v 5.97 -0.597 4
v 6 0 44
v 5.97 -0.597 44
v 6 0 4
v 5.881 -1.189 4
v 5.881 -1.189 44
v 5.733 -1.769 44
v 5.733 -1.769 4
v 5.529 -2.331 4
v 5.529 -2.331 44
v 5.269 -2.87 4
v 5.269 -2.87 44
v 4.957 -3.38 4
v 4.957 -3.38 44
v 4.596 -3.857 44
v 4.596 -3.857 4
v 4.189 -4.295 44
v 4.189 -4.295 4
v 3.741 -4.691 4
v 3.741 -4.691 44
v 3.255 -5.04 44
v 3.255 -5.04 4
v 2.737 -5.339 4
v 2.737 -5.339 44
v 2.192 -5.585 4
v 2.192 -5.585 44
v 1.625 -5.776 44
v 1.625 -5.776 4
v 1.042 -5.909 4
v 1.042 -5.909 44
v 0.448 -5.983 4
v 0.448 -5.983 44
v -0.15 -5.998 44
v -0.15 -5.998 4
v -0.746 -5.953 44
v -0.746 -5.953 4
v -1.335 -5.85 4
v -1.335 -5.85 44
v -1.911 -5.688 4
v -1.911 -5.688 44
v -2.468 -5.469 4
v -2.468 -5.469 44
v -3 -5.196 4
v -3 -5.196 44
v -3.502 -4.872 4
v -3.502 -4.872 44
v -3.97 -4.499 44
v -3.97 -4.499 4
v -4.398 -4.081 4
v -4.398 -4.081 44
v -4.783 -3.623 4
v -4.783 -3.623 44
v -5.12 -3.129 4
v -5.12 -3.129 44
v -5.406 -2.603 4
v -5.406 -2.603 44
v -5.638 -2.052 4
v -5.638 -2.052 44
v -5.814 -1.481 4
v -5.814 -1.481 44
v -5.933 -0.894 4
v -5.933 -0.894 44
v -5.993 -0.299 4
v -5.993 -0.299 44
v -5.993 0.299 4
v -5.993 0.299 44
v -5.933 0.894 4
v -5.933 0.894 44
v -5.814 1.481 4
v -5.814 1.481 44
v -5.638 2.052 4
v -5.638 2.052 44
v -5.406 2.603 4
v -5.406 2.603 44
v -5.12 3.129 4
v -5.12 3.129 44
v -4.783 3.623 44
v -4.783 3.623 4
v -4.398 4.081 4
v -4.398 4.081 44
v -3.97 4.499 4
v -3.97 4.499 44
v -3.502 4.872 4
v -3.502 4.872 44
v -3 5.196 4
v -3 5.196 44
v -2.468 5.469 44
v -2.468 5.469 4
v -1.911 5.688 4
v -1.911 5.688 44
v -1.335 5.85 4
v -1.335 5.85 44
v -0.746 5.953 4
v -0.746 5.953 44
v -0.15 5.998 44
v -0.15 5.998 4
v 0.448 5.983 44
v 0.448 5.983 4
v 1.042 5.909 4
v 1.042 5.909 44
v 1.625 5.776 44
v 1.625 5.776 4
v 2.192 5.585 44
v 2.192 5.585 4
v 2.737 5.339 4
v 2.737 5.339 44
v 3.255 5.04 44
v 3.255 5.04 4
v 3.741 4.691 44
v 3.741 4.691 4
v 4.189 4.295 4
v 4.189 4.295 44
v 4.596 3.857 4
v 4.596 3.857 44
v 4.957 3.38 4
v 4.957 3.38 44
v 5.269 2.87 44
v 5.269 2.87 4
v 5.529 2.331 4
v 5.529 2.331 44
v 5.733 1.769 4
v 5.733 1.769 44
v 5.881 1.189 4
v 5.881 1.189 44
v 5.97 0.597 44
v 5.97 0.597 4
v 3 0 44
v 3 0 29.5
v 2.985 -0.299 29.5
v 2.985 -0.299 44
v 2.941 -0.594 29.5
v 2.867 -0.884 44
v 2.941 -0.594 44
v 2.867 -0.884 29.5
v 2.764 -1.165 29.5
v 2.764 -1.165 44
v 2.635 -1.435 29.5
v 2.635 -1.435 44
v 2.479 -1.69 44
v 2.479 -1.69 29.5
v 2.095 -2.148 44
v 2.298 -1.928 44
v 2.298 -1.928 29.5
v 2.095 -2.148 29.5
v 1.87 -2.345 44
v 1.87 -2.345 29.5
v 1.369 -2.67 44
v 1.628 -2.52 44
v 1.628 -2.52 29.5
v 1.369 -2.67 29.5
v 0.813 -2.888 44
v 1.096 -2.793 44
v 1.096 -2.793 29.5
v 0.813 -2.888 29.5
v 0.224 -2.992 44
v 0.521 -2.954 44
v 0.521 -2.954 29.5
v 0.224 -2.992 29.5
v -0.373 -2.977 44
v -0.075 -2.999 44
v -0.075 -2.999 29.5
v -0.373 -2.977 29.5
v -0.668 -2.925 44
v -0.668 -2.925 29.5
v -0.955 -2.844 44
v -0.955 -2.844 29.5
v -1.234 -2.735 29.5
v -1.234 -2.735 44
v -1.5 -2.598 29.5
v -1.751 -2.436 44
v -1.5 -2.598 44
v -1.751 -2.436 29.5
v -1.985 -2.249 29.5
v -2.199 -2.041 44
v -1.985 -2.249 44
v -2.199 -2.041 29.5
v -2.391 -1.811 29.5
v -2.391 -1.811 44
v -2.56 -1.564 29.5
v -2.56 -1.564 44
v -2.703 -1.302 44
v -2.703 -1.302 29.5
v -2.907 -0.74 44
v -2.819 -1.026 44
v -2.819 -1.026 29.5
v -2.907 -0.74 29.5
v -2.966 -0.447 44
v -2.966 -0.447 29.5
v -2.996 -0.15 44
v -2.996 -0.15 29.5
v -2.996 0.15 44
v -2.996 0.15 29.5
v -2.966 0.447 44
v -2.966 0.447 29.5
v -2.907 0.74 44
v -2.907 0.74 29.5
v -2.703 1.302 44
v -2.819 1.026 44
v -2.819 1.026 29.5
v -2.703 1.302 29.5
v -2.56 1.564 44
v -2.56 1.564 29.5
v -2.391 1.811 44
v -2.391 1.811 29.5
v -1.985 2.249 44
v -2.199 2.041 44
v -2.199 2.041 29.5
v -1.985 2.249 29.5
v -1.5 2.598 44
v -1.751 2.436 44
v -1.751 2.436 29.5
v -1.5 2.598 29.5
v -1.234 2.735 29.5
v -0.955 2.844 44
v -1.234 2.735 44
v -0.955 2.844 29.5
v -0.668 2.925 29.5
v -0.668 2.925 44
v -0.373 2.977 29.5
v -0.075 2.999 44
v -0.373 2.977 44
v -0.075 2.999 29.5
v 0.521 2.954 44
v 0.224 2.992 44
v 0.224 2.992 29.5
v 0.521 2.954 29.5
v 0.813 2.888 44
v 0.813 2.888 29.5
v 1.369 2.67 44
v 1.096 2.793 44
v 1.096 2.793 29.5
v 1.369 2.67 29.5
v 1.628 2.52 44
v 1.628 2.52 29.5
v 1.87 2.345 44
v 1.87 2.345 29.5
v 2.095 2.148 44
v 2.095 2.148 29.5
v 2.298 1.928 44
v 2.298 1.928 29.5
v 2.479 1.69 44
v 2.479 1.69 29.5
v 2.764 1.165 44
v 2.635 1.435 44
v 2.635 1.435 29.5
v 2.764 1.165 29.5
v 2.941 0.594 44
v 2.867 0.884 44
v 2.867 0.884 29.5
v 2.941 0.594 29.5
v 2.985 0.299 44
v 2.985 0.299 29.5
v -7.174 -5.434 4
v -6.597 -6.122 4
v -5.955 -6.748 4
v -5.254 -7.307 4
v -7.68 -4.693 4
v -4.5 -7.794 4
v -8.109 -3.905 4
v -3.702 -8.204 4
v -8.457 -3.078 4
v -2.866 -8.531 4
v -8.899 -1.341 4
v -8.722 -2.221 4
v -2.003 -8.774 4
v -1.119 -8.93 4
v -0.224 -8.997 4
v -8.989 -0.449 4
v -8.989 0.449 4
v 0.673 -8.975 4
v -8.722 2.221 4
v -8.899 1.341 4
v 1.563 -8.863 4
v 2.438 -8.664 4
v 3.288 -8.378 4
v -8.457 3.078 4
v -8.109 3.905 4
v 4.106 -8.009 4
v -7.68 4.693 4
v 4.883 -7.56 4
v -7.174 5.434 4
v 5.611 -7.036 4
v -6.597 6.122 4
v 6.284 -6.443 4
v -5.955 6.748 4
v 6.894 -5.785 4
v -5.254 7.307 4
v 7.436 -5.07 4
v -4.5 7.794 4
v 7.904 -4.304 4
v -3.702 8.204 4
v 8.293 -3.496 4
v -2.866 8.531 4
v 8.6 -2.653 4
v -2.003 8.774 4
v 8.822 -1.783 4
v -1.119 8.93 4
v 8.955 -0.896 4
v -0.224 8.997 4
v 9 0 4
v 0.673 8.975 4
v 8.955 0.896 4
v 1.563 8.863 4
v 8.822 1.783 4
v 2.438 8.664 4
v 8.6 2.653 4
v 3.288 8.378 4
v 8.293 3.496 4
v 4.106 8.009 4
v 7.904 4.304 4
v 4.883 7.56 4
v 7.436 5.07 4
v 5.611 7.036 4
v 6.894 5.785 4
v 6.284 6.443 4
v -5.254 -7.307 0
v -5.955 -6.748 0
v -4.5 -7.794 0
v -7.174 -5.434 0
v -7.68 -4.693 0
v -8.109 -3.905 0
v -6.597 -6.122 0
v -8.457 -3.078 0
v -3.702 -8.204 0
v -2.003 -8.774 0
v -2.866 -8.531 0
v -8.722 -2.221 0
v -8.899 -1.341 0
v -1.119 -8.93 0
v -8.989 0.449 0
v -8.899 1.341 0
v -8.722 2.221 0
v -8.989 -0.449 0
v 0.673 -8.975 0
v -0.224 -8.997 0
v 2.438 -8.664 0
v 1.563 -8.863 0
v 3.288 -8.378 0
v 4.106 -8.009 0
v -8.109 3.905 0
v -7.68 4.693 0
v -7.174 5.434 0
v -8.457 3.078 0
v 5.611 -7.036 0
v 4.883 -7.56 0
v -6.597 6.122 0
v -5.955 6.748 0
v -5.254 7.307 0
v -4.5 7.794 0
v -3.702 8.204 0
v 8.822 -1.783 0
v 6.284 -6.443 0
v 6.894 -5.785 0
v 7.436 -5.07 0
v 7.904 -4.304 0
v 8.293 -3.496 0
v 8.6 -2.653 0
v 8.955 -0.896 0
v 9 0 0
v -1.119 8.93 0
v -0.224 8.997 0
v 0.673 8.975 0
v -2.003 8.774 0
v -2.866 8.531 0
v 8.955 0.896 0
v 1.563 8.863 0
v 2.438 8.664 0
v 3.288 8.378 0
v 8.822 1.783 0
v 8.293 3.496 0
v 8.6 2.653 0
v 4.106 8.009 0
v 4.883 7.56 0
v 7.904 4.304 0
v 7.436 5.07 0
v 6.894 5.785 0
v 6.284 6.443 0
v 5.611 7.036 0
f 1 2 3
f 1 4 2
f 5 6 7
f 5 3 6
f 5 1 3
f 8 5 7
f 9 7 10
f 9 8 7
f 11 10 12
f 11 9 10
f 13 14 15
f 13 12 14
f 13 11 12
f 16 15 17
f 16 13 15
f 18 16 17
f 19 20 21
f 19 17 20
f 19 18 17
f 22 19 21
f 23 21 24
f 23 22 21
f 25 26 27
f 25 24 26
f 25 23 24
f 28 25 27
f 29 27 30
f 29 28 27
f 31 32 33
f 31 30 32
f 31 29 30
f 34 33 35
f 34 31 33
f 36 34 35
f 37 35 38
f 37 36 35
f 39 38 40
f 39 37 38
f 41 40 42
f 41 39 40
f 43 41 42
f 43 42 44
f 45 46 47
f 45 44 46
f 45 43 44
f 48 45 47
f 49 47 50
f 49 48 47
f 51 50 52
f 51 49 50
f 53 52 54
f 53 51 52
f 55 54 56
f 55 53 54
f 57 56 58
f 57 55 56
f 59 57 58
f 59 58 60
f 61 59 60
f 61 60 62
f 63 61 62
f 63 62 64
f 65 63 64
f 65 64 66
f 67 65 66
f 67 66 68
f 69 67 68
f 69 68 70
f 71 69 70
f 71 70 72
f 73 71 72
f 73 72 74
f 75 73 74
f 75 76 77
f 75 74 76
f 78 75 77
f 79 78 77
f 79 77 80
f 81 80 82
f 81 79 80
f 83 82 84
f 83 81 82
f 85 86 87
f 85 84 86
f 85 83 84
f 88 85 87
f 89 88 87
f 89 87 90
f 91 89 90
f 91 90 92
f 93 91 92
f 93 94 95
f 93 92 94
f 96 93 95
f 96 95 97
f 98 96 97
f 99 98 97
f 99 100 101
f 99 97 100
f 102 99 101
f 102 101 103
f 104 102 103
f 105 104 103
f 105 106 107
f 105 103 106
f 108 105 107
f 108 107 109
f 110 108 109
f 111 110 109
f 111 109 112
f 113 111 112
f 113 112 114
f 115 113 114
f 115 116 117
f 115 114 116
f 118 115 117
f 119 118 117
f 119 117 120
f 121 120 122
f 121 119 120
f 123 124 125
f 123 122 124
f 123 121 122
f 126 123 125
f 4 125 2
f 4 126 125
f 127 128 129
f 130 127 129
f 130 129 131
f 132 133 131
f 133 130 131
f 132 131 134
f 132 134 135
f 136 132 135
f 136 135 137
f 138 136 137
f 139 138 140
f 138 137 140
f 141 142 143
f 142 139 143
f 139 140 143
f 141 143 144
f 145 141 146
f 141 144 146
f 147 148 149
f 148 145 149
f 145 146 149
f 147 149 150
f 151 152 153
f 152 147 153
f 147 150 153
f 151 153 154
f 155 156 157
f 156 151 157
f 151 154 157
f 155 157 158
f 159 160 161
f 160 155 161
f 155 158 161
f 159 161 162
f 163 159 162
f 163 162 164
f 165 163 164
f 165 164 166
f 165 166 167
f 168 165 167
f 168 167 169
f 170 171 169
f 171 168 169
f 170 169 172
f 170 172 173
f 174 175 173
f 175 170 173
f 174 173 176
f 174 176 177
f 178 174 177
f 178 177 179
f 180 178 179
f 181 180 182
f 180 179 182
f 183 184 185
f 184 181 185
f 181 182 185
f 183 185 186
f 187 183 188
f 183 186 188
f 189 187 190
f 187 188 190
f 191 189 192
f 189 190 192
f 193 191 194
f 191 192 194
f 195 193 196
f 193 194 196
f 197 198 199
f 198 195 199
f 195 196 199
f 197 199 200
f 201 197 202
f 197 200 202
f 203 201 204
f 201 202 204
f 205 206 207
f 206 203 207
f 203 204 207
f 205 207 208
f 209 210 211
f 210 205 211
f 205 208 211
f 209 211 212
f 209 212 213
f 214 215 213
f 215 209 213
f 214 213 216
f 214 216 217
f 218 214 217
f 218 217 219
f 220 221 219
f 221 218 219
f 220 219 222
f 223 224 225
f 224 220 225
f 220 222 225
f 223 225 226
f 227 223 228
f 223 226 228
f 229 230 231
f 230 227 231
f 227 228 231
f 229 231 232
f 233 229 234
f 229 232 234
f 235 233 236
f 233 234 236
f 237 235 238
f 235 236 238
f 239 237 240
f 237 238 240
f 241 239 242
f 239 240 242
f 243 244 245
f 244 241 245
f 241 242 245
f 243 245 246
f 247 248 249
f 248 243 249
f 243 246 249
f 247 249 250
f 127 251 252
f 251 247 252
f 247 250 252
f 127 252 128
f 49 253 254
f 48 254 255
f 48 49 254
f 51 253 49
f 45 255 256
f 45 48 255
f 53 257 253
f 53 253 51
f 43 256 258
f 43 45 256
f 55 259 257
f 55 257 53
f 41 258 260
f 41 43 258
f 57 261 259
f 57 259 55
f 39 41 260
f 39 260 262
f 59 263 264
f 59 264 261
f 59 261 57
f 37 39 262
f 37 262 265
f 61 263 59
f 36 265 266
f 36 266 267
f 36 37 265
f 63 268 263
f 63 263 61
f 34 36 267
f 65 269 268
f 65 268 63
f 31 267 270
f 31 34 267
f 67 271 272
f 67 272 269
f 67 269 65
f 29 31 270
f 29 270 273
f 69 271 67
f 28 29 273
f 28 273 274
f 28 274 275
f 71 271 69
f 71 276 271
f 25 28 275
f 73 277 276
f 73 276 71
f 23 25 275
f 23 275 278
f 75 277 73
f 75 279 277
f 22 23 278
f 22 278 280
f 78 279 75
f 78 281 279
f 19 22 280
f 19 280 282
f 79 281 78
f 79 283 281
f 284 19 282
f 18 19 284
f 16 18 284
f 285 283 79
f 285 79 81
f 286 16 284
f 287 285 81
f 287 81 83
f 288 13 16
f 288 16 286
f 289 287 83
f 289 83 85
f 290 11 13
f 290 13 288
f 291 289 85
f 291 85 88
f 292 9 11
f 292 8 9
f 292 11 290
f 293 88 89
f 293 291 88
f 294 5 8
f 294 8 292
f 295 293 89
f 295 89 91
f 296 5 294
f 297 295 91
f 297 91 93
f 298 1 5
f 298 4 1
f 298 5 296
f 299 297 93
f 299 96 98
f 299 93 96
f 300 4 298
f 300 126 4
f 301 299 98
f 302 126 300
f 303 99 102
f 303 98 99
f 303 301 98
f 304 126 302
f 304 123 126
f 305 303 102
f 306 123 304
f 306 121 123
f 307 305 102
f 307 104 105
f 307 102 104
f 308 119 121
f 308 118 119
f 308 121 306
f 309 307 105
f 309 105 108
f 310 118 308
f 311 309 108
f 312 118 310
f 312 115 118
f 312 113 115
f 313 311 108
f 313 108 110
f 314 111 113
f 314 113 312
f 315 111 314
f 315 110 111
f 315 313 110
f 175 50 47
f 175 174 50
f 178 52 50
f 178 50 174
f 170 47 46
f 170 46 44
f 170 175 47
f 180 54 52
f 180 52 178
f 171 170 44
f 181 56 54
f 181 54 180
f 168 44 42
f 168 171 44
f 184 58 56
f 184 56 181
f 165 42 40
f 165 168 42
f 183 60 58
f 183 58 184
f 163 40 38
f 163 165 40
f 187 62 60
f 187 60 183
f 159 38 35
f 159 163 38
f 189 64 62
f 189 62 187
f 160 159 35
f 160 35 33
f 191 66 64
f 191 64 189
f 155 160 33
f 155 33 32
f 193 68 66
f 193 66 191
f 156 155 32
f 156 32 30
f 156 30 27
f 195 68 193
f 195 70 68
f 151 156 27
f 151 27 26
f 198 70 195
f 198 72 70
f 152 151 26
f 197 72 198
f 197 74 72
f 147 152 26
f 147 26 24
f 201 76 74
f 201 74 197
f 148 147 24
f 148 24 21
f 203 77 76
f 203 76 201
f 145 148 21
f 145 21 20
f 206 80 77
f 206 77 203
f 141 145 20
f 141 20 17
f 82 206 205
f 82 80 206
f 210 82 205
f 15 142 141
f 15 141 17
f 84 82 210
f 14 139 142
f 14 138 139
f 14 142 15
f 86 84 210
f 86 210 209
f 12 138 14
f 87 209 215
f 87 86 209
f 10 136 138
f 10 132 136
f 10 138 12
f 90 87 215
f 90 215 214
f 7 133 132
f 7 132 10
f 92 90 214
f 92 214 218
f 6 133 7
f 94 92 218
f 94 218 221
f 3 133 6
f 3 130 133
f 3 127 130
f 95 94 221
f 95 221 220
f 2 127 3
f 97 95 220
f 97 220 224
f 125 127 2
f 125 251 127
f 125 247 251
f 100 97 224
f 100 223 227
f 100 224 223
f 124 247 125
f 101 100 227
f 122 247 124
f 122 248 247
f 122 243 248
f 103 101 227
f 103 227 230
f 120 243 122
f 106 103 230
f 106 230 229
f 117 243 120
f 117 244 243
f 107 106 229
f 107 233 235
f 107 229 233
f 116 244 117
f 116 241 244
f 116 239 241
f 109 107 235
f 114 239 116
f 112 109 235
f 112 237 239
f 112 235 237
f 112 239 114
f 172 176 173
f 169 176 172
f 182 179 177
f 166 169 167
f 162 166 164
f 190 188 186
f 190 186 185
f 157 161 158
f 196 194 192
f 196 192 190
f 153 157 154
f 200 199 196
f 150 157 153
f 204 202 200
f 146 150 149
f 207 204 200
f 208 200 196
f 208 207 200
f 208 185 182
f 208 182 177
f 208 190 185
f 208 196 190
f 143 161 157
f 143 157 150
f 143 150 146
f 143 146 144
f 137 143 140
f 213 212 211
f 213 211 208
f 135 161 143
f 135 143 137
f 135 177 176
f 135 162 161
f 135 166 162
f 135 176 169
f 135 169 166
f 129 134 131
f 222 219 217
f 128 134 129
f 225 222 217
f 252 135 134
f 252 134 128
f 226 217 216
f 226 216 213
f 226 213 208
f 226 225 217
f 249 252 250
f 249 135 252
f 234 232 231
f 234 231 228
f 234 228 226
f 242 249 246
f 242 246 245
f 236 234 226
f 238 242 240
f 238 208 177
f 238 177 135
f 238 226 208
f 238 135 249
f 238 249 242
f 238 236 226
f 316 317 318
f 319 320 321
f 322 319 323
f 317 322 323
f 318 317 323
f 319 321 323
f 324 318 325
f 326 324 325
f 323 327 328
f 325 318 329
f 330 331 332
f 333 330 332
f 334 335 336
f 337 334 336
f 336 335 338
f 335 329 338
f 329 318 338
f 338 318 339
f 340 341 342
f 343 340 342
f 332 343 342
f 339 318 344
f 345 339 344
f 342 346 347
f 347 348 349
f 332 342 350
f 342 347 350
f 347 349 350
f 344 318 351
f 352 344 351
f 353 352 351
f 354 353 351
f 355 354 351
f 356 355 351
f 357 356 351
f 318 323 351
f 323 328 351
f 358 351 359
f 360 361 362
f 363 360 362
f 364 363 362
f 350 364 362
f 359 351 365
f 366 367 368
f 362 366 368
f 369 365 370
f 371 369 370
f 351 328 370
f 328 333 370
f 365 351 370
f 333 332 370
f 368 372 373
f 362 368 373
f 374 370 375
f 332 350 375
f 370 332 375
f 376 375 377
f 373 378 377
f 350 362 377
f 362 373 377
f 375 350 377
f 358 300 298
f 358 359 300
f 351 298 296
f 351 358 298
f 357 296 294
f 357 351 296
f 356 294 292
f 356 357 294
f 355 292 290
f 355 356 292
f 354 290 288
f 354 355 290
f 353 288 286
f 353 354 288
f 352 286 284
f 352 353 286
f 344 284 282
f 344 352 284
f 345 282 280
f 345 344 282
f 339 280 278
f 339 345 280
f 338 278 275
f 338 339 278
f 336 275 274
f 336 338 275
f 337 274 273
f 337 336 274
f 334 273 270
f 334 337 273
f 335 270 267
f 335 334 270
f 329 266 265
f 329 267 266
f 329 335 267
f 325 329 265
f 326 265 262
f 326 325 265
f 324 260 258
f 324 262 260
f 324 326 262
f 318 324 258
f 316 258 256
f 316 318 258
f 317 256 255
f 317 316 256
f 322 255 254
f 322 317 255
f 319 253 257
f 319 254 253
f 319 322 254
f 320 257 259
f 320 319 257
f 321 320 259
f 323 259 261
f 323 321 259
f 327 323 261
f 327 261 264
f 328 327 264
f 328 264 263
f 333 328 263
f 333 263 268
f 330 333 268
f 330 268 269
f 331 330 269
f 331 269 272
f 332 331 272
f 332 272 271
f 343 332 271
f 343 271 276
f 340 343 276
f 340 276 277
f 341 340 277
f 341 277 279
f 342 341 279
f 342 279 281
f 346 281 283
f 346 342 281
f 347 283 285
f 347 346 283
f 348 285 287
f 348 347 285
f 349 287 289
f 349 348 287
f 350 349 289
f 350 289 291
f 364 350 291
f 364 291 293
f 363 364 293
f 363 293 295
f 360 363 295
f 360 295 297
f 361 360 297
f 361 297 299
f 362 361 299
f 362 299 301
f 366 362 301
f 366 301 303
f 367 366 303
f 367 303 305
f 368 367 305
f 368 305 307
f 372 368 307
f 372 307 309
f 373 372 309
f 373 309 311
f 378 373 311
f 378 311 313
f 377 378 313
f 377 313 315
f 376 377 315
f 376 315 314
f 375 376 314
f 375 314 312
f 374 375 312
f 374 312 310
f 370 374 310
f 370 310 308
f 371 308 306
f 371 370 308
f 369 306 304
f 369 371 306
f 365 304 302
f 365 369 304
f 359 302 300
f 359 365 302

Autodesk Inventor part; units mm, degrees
ref_plane "YZ Plane" through (0, 0, 0) normal (1, 0, 0) x (0, 1, 0)
ref_plane "XZ Plane" through (0, 0, 0) normal (0, 1, 0) x (-1, 0, 0)
ref_plane "XY Plane" through (0, 0, 0) normal (0, 0, 1) x (1, 0, 0)
sketch "Sketch1" plane through (0, 0, 0) normal (0, 0, 1) x (1, 0, 0)
  circle A0 centre (0, 0) radius 9
  dimension "d0" = 18
extrude "Extrusion1" add sketch "Sketch1" along normal blind 4
sketch "Sketch2" plane through (0, 0, 4) normal (0, 0, 1) x (1, 0, 0)
  circle A0 centre (0, 0) radius 6
  circle A1 centre (0, 0) radius 3
  dimension "d3" = 12
  dimension "d4" = 6
extrude "Extrusion2" add sketch "Sketch2" along normal blind 40
sketch "Sketch4" plane through (0, 0, 4) normal (0, 0, 1) x (1, 0, 0)
  circle A0 centre (0, 0) radius 3
extrude "Extrusion3" add sketch "Sketch4" along normal blind 25.5
properties part number "Adaptateur_axes"
